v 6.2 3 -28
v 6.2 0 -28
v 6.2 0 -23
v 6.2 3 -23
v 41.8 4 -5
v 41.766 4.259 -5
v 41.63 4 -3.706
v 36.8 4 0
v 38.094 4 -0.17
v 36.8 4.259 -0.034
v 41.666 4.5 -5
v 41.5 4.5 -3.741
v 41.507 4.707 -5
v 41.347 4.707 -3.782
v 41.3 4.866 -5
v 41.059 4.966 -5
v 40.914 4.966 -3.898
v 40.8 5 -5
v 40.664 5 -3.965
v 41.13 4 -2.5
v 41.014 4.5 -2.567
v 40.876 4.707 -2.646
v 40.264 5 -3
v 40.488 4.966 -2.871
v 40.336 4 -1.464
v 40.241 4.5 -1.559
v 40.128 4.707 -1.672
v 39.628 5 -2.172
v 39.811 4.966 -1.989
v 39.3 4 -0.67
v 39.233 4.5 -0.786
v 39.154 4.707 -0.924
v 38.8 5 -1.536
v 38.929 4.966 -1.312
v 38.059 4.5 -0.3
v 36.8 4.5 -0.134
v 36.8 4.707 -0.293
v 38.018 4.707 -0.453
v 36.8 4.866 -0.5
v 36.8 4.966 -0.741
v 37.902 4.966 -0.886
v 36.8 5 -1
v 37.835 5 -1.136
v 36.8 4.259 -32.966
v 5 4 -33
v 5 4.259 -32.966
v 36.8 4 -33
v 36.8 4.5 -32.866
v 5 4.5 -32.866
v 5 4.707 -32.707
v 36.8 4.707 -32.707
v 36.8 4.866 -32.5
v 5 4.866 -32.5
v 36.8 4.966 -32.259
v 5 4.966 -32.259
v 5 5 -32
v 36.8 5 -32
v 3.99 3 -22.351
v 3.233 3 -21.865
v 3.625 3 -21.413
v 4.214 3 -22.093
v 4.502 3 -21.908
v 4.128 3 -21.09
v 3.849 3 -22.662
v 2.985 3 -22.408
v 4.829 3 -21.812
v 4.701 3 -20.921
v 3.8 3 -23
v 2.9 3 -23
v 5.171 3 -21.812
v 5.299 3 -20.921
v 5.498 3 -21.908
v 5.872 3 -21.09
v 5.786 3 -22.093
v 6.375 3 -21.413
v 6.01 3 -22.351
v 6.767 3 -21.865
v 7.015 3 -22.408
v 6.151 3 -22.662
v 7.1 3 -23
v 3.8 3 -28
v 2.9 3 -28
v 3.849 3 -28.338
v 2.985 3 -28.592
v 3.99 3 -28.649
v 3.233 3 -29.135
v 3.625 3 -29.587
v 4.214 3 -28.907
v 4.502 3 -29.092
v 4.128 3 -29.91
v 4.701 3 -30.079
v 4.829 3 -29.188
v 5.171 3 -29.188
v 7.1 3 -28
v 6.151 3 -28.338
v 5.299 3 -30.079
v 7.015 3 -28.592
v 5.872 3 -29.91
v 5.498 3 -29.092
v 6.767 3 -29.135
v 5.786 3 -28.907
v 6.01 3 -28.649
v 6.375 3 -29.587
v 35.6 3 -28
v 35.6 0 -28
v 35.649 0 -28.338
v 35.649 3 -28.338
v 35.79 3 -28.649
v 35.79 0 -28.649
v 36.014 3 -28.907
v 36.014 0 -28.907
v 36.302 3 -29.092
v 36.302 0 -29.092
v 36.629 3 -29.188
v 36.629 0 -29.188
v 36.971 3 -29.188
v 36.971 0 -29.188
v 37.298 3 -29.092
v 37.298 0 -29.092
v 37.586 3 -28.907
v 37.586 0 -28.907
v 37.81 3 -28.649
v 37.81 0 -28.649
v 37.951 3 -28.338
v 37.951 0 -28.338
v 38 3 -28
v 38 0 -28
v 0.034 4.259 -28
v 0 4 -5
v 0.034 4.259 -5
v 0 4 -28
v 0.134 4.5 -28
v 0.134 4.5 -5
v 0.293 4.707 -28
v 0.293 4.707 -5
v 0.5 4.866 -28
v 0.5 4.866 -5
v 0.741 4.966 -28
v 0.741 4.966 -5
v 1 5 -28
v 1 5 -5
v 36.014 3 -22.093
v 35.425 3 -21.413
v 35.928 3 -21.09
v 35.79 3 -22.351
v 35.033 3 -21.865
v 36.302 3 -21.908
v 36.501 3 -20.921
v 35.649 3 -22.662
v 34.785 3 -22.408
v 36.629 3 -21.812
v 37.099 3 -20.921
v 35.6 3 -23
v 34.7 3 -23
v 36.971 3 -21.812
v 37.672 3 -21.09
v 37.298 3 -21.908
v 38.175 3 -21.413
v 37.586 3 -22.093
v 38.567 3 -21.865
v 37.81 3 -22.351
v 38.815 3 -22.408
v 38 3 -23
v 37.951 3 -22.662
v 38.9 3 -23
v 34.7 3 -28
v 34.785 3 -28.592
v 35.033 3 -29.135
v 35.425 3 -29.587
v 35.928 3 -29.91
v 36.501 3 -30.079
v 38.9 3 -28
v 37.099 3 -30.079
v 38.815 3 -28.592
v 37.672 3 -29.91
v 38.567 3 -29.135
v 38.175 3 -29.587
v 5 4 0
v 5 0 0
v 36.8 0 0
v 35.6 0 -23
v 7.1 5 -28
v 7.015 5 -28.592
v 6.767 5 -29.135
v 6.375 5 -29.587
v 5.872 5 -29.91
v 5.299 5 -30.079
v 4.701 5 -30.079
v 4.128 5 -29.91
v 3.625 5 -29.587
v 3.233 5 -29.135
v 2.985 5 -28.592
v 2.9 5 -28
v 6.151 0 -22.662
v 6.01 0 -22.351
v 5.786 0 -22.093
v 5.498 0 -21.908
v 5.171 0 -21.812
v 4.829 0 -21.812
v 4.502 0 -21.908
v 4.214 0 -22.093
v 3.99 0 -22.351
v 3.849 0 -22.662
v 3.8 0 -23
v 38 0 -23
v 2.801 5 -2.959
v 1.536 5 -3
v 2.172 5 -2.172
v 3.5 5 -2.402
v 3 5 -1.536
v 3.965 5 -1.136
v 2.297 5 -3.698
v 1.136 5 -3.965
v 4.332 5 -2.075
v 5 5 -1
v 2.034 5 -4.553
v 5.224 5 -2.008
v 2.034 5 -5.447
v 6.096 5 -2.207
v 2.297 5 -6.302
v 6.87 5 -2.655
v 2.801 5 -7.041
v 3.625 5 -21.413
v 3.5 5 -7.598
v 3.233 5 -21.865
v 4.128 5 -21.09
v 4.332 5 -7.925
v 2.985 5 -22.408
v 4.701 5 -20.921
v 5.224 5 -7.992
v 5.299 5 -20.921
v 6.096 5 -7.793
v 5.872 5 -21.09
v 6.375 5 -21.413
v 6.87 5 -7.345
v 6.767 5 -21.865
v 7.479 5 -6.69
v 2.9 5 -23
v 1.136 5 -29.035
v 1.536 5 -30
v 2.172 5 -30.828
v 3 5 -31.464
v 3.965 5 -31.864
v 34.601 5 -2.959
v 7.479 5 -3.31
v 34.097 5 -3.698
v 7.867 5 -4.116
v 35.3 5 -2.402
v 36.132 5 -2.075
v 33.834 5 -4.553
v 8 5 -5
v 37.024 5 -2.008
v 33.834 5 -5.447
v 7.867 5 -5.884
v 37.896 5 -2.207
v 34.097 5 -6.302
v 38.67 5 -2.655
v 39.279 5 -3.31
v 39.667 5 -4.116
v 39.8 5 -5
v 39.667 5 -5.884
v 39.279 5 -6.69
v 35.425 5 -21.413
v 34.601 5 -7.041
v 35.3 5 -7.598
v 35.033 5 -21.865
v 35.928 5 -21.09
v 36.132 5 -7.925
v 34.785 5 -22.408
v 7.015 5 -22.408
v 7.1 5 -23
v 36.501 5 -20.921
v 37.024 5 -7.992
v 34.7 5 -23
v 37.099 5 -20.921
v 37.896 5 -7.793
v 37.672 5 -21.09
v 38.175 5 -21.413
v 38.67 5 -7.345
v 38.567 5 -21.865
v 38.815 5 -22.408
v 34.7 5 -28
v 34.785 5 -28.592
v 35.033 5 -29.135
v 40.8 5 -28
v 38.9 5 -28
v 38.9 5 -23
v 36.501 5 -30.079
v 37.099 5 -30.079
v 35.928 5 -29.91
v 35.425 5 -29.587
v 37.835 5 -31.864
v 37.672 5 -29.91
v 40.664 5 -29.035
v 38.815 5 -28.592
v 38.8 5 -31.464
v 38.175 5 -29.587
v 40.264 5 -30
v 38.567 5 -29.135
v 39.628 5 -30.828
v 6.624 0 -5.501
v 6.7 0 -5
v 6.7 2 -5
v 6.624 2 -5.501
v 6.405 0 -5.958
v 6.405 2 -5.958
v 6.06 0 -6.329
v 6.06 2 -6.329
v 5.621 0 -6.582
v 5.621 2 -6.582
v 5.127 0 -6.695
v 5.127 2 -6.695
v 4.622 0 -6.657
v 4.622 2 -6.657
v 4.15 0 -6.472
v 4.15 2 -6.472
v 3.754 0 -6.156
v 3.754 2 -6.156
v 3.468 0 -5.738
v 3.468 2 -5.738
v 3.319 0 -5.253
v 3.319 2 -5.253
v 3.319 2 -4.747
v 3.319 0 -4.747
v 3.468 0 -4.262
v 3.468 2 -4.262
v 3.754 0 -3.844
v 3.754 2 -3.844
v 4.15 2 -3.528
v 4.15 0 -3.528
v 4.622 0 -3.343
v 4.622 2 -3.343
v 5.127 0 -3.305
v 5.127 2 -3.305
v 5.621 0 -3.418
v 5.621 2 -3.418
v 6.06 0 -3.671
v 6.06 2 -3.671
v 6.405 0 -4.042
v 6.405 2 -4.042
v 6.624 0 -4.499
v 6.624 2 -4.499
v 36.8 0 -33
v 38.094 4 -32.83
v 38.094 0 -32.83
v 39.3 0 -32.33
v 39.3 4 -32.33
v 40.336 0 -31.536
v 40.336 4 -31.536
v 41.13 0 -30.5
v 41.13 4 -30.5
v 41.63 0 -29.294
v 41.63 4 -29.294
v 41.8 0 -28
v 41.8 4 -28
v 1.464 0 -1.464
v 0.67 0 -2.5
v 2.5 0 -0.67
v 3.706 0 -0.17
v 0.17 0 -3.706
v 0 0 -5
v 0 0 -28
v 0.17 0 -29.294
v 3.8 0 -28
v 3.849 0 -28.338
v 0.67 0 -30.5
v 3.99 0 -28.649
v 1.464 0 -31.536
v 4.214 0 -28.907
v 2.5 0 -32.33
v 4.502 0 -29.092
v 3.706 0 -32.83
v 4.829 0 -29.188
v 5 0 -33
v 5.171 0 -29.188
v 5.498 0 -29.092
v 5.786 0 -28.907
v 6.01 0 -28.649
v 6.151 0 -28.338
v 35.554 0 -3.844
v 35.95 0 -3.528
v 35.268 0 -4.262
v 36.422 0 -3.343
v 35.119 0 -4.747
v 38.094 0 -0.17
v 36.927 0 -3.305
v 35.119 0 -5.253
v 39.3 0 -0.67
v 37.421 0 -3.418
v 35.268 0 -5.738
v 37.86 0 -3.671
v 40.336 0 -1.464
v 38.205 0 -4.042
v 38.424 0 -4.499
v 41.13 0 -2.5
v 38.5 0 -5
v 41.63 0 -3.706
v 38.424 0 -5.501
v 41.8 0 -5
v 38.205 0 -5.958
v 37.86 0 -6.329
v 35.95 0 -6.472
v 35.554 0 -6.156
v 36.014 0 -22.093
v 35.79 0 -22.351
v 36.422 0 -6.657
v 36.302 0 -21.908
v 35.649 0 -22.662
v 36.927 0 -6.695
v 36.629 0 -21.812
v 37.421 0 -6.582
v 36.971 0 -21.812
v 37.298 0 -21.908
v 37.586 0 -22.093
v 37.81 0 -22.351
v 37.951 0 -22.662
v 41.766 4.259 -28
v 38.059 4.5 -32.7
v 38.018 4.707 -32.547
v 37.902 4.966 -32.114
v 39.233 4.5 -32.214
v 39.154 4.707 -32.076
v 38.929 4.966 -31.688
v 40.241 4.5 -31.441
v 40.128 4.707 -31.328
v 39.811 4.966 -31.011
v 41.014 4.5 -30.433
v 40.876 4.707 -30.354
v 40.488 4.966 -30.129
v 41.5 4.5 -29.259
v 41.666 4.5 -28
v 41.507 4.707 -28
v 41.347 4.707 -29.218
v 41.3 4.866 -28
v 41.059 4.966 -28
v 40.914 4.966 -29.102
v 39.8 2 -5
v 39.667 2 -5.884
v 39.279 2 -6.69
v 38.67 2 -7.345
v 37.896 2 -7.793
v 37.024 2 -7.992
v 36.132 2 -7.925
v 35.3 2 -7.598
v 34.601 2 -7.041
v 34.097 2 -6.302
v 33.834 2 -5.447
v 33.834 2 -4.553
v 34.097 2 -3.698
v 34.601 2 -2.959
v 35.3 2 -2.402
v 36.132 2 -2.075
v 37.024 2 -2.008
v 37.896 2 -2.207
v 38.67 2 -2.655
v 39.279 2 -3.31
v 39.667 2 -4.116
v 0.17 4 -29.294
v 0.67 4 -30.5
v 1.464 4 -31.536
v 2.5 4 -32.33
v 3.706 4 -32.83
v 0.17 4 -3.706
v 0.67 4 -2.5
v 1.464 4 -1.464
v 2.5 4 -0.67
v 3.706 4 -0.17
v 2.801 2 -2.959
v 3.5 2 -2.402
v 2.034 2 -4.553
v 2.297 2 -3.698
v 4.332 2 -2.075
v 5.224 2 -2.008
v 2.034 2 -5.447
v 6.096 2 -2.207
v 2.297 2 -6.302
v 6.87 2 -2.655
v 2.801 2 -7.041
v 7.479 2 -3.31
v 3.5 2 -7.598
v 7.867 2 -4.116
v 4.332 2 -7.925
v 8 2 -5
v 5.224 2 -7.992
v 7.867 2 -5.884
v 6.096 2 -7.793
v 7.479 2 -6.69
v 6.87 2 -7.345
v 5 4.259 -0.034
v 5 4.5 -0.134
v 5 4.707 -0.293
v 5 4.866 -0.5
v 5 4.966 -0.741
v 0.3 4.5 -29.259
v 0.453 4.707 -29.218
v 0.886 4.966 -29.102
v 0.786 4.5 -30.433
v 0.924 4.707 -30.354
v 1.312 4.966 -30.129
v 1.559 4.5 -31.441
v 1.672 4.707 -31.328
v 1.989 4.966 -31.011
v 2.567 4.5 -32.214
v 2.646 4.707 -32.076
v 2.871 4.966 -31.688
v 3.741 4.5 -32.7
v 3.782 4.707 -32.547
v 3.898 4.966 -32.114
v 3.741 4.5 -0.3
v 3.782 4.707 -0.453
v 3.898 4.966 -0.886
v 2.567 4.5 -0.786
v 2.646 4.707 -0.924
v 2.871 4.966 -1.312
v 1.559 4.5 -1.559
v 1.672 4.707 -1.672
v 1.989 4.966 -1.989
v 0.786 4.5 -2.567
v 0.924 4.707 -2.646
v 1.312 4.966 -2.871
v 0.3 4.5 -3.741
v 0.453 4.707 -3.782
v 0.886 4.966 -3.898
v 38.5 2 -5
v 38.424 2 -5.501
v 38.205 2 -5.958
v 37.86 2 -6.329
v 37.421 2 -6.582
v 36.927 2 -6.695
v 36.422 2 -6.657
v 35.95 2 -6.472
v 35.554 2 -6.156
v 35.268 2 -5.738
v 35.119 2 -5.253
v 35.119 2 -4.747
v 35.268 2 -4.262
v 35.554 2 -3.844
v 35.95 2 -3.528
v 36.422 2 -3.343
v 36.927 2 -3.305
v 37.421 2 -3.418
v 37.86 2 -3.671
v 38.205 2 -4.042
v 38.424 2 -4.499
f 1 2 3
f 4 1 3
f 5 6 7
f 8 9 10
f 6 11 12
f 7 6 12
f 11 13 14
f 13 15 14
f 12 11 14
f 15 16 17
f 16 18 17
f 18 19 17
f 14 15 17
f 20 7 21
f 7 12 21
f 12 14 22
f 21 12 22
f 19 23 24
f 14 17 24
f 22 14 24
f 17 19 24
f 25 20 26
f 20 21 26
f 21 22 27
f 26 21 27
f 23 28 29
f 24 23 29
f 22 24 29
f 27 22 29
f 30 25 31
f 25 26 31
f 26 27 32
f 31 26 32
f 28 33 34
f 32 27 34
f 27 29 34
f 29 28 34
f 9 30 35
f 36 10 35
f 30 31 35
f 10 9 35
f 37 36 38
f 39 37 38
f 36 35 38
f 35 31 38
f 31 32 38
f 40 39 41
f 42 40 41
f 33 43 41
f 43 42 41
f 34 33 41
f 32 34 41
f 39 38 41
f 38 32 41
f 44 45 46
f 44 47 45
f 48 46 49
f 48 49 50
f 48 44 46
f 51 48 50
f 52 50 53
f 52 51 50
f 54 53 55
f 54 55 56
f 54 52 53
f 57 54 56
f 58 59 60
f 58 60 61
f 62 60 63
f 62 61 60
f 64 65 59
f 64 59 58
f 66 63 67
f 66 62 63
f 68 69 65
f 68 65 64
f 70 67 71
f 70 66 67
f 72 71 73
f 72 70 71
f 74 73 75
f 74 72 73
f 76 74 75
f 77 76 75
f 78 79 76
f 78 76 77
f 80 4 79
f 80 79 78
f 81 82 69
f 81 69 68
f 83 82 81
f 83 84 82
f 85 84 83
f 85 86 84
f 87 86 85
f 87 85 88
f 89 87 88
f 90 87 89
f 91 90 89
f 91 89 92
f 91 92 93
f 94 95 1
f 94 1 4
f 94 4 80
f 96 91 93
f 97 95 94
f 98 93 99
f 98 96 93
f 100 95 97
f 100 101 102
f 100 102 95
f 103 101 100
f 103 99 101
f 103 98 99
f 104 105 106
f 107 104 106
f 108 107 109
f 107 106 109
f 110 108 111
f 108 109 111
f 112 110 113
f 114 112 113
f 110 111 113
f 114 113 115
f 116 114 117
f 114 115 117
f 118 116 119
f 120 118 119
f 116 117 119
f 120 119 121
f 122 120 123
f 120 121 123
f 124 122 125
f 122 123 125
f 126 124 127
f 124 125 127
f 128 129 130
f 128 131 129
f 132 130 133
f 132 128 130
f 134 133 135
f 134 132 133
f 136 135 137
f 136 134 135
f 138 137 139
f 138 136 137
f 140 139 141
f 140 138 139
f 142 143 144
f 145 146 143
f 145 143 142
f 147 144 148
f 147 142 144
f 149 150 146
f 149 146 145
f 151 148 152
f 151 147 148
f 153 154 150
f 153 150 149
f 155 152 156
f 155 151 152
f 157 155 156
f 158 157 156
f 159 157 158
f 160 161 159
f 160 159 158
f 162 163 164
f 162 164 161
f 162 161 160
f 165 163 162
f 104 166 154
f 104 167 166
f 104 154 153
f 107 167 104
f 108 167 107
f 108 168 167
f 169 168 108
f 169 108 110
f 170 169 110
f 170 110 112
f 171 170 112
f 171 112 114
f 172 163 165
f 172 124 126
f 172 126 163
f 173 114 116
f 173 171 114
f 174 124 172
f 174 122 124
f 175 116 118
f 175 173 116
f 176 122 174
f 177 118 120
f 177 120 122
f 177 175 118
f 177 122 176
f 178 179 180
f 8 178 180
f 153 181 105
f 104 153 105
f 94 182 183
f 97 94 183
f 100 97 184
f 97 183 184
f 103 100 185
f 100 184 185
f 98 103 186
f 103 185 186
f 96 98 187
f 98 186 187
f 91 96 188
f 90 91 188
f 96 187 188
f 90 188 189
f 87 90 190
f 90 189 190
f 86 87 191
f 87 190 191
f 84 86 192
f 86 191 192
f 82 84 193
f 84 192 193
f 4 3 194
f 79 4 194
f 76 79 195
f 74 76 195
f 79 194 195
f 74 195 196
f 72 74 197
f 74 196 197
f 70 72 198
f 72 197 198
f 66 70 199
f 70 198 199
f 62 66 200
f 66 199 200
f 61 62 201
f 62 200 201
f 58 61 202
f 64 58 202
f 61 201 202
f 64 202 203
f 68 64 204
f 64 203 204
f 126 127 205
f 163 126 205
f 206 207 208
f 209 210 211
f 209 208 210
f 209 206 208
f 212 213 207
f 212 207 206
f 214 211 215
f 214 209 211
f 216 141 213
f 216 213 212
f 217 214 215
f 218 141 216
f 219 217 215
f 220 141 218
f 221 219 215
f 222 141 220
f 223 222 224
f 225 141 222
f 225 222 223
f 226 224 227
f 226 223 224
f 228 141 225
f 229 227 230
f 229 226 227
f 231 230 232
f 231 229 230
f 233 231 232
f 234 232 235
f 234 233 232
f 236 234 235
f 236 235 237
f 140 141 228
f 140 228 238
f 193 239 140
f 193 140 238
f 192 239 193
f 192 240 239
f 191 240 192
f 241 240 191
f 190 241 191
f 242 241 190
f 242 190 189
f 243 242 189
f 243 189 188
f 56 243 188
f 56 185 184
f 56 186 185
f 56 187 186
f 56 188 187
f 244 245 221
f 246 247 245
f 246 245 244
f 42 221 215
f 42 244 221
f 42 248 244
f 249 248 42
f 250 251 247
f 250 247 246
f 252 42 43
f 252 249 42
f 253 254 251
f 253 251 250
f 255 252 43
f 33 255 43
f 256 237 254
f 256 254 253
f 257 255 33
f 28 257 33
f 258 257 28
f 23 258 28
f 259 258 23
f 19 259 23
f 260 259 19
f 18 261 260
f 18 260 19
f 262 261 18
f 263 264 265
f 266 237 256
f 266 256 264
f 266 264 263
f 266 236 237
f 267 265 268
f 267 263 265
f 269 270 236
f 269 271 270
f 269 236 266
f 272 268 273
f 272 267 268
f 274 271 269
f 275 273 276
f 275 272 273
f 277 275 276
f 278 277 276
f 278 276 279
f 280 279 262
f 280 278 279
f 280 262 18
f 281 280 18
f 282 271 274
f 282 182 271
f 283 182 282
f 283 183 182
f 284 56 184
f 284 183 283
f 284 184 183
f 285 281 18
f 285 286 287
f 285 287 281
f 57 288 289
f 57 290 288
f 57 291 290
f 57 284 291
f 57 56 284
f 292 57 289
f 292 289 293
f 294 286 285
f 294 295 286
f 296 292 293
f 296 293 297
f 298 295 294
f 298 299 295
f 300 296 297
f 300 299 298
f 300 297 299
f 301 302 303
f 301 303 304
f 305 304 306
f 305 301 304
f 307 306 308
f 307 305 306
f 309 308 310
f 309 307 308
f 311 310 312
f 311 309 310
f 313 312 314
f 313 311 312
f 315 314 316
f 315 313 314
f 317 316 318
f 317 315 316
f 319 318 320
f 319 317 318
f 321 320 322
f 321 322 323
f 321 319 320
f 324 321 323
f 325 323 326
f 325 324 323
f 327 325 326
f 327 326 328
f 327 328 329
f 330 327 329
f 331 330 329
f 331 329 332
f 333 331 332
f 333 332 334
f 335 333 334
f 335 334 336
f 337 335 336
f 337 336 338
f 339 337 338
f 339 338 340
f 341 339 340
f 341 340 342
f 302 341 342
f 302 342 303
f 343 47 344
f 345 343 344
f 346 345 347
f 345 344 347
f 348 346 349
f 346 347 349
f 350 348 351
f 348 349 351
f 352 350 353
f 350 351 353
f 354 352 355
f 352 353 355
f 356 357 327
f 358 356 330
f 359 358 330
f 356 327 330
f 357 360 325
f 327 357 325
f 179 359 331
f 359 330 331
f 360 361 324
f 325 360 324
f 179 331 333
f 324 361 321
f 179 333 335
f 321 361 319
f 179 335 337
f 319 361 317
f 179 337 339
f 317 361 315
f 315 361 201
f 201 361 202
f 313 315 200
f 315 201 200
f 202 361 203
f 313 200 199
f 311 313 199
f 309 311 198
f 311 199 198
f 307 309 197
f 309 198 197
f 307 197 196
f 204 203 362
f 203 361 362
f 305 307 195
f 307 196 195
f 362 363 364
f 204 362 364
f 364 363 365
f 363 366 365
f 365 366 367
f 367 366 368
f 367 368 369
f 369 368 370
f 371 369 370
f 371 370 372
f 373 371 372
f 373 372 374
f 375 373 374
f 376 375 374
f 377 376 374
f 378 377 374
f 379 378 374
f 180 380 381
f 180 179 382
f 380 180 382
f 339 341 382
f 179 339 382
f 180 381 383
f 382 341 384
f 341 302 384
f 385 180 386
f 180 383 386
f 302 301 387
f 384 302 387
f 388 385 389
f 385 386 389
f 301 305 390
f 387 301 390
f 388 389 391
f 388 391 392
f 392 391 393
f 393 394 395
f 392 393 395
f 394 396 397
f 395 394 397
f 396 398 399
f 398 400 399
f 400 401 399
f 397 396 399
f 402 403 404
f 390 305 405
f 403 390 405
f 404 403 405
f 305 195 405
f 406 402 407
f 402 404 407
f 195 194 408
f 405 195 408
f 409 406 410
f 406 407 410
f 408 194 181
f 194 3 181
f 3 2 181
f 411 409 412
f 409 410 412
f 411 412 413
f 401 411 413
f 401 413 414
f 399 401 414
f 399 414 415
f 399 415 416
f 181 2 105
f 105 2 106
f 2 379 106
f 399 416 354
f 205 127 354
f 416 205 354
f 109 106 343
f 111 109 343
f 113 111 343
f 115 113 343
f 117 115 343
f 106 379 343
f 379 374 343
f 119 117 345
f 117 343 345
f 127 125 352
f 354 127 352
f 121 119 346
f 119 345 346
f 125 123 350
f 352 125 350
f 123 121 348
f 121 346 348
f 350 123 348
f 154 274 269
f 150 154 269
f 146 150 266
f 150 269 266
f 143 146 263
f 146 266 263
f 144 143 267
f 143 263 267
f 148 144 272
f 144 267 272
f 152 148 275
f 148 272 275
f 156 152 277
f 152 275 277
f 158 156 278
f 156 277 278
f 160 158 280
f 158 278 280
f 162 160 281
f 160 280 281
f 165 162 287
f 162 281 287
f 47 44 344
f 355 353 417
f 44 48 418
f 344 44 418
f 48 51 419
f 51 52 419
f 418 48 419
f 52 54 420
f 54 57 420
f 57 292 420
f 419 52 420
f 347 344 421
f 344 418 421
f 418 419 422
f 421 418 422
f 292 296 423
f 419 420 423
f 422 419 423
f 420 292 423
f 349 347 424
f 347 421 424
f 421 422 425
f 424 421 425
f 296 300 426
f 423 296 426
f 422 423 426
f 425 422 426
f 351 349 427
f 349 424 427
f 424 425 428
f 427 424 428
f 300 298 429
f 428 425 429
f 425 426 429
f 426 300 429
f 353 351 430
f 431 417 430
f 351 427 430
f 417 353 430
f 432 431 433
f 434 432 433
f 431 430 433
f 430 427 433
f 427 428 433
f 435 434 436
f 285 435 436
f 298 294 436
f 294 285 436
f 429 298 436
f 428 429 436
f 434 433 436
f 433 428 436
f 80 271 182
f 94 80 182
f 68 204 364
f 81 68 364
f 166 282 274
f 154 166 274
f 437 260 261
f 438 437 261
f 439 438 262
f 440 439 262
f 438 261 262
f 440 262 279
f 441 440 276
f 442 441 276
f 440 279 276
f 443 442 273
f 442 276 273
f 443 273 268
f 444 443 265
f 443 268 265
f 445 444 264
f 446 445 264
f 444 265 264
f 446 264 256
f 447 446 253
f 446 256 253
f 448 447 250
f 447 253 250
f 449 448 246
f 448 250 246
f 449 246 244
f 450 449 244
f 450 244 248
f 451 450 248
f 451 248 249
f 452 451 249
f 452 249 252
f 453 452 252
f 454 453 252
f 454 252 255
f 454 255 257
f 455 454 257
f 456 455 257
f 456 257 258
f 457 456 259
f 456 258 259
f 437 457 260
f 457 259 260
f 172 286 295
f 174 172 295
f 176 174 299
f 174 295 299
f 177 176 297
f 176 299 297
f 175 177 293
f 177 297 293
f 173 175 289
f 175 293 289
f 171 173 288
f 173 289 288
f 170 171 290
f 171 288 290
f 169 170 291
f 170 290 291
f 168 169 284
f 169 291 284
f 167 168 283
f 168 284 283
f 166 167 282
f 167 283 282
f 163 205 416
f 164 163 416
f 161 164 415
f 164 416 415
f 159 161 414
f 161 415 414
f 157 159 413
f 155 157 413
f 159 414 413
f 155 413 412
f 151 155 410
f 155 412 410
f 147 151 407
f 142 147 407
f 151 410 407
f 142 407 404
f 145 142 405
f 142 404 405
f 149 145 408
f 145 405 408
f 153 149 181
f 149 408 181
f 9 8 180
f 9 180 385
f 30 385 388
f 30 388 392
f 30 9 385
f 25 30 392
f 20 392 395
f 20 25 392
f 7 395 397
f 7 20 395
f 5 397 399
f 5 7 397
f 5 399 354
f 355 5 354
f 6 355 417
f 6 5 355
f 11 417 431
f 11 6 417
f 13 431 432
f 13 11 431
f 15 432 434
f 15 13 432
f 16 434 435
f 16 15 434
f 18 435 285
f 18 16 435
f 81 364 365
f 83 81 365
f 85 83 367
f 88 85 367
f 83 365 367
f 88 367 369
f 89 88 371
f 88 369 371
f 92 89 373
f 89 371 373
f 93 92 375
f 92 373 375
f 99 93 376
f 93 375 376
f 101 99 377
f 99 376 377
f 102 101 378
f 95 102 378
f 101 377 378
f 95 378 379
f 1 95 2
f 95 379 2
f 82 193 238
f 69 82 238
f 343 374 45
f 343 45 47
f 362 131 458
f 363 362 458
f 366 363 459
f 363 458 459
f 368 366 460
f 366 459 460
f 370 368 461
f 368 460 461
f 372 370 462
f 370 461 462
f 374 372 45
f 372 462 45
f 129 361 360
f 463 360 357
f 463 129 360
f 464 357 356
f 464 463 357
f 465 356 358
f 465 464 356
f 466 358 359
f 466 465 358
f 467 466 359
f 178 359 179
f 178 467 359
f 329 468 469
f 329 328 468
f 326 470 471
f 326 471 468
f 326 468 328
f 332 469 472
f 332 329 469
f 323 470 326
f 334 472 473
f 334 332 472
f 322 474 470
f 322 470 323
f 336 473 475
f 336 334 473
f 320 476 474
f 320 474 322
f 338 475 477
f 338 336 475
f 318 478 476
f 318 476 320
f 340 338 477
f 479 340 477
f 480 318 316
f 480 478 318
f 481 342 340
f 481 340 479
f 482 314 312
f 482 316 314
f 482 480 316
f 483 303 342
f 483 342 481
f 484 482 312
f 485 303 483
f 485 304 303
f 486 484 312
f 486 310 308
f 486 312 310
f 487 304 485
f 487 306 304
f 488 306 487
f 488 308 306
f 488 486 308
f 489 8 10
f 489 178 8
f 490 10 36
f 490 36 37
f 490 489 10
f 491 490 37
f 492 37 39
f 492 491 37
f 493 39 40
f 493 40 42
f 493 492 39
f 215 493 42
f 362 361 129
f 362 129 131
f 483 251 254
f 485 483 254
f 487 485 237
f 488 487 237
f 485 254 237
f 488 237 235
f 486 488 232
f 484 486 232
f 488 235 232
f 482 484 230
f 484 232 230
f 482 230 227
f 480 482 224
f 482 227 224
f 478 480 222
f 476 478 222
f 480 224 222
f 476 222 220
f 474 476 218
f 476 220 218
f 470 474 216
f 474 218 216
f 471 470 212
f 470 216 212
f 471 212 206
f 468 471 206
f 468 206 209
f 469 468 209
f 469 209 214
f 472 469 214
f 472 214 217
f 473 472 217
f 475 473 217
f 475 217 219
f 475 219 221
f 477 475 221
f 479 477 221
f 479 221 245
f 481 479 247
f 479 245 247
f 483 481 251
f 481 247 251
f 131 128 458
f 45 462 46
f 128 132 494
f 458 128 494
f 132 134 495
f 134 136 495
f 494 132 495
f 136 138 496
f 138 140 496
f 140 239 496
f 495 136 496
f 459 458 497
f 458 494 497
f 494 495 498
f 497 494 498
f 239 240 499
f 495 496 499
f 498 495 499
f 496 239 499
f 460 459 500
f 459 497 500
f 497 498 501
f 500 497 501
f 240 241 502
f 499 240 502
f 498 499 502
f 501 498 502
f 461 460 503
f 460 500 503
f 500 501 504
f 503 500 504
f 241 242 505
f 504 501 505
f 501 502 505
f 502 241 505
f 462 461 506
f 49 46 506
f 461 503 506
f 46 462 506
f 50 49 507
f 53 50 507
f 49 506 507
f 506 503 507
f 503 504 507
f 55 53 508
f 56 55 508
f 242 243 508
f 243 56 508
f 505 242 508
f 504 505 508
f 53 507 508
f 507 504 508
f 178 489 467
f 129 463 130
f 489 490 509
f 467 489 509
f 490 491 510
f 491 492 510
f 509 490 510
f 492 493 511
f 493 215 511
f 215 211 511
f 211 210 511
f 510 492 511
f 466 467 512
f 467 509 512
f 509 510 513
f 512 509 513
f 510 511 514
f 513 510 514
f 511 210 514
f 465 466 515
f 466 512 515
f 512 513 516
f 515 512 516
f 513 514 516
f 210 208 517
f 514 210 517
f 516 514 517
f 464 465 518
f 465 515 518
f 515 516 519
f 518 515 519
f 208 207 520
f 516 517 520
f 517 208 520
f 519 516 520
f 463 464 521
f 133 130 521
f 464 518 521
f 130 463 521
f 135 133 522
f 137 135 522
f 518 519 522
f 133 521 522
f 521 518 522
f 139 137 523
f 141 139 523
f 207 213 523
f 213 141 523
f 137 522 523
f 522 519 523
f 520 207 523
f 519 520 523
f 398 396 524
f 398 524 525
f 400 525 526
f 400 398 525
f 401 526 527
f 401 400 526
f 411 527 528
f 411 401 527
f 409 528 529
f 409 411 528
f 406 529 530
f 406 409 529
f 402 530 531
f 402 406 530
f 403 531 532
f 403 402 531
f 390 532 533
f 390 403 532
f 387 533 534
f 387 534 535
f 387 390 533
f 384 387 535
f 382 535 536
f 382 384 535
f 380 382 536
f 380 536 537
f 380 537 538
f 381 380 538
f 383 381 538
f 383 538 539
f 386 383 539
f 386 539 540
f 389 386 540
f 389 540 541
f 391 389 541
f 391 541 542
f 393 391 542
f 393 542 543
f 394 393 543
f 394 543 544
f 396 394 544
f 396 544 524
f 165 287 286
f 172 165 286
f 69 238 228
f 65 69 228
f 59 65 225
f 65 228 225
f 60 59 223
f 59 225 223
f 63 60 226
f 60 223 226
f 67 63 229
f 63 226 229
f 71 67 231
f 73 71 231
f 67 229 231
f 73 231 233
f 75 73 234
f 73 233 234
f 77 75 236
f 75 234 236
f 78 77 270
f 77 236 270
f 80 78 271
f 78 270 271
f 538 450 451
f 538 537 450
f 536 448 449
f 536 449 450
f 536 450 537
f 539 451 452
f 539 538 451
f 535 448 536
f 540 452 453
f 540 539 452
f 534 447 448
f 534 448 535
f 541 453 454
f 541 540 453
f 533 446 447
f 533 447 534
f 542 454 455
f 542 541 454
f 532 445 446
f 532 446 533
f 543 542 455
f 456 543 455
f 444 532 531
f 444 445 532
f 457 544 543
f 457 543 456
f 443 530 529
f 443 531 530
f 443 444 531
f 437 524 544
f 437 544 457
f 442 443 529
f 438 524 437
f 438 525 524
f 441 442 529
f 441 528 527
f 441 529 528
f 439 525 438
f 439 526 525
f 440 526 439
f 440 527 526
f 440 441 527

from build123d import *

# Parameters (mm, degrees)
SKETCH1_W           = 41.8
SKETCH1_H           = 33
SKETCH1_R           = 1.7
BOSS_EXTRUDE1_DEPTH = 5
FILLET1_R           = 5
FILLET2_R           = 1
CUT_EXTRUDE1_START  = -3
SKETCH2_R           = 3
SKETCH2_R_2         = 1.7
CUT_EXTRUDE1_DEPTH  = 3
CUT_EXTRUDE2_START  = -2
CUT_EXTRUDE2_DEPTH  = 2


with BuildPart() as part:
    # Sketch1 → Boss-Extrude1 (new body)
    with BuildSketch(Plane(origin=(0, 0, 0), x_dir=(1, 0, 0), z_dir=(0, 1, 0))):
        with Locations((20.9, 16.5)):
            Rectangle(SKETCH1_W, SKETCH1_H)
        with Locations((5, 5)):
            Circle(SKETCH1_R, mode=Mode.SUBTRACT)
        with Locations((36.8, 5)):
            Circle(SKETCH1_R, mode=Mode.SUBTRACT)
        with BuildLine():
            Line((3.8, 23), (3.8, 28))
            ThreePointArc((3.8, 28), (5, 29.2), (6.2, 28))
            Line((6.2, 28), (6.2, 23))
            ThreePointArc((6.2, 23), (5, 21.8), (3.8, 23))
        make_face(mode=Mode.SUBTRACT)
        with BuildLine():
            Line((35.6, 23), (35.6, 28))
            ThreePointArc((35.6, 28), (36.8, 29.2), (38, 28))
            Line((38, 28), (38, 23))
            ThreePointArc((38, 23), (36.8, 21.8), (35.6, 23))
        make_face(mode=Mode.SUBTRACT)
    extrude(amount=BOSS_EXTRUDE1_DEPTH)

    # Fillet1
    fillet1_edges = [part.edges().sort_by_distance(p)[0] for p in [
        (0, 2.5, -33),
        (41.8, 2.5, -33),
        (41.8, 2.5, 0),
        (0, 2.5, 0),
    ]]
    fillet(fillet1_edges, radius=FILLET1_R)

    # Fillet2
    fillet2_edges = [part.edges().sort_by_distance(p)[0] for p in [
        (1.464466094, 5, -1.464466094),
        (0, 5, -16.5),
        (1.464466094, 5, -31.535533906),
        (20.9, 5, -33),
        (40.335533906, 5, -31.535533906),
        (41.8, 5, -16.5),
        (40.335533906, 5, -1.464466094),
        (20.9, 5, 0),
    ]]
    fillet(fillet2_edges, radius=FILLET2_R)

    # Sketch2 → Cut-Extrude1 (cut)
    # profile 1 of 2: a face of its own
    with BuildSketch(Plane(origin=(0, 5, 0), x_dir=(1, 0, 0), z_dir=(0, 1, 0)).offset(CUT_EXTRUDE1_START)):
        with Locations((5, 5)):
            Circle(SKETCH2_R)
        with Locations((5, 5)):
            Circle(SKETCH2_R_2, mode=Mode.SUBTRACT)
    # profile 2 of 2: a face of its own
    with BuildSketch(Plane(origin=(0, 5, 0), x_dir=(1, 0, 0), z_dir=(0, 1, 0)).offset(CUT_EXTRUDE1_START)):
        with Locations((36.8, 5)):
            Circle(SKETCH2_R)
        with Locations((36.8, 5)):
            Circle(SKETCH2_R_2, mode=Mode.SUBTRACT)
    extrude(amount=CUT_EXTRUDE1_DEPTH, mode=Mode.SUBTRACT)

    # Sketch2<3> → Cut-Extrude2 (cut)
    # profile 1 of 2: a face of its own
    with BuildSketch(Plane(origin=(0, 5, 0), x_dir=(1, 0, 0), z_dir=(0, 1, 0)).offset(CUT_EXTRUDE2_START)):
        with BuildLine():
            Line((7.1, 23), (7.1, 28))
            ThreePointArc((7.1, 28), (5, 30.1), (2.9, 28))
            Line((2.9, 28), (2.9, 23))
            ThreePointArc((2.9, 23), (5, 20.9), (7.1, 23))
        make_face()
        with BuildLine():
            Line((6.2, 28), (6.2, 23))
            ThreePointArc((6.2, 23), (5, 21.8), (3.8, 23))
            Line((3.8, 23), (3.8, 28))
            ThreePointArc((3.8, 28), (5, 29.2), (6.2, 28))
        make_face(mode=Mode.SUBTRACT)
    # profile 2 of 2: a face of its own
    with BuildSketch(Plane(origin=(0, 5, 0), x_dir=(1, 0, 0), z_dir=(0, 1, 0)).offset(CUT_EXTRUDE2_START)):
        with BuildLine():
            Line((38.9, 23), (38.9, 28))
            ThreePointArc((38.9, 28), (36.8, 30.1), (34.7, 28))
            Line((34.7, 28), (34.7, 23))
            ThreePointArc((34.7, 23), (36.8, 20.9), (38.9, 23))
        make_face()
        with BuildLine():
            Line((38, 28), (38, 23))
            ThreePointArc((38, 23), (36.8, 21.8), (35.6, 23))
            Line((35.6, 23), (35.6, 28))
            ThreePointArc((35.6, 28), (36.8, 29.2), (38, 28))
        make_face(mode=Mode.SUBTRACT)
    extrude(amount=CUT_EXTRUDE2_DEPTH, mode=Mode.SUBTRACT)


solid = part.part
